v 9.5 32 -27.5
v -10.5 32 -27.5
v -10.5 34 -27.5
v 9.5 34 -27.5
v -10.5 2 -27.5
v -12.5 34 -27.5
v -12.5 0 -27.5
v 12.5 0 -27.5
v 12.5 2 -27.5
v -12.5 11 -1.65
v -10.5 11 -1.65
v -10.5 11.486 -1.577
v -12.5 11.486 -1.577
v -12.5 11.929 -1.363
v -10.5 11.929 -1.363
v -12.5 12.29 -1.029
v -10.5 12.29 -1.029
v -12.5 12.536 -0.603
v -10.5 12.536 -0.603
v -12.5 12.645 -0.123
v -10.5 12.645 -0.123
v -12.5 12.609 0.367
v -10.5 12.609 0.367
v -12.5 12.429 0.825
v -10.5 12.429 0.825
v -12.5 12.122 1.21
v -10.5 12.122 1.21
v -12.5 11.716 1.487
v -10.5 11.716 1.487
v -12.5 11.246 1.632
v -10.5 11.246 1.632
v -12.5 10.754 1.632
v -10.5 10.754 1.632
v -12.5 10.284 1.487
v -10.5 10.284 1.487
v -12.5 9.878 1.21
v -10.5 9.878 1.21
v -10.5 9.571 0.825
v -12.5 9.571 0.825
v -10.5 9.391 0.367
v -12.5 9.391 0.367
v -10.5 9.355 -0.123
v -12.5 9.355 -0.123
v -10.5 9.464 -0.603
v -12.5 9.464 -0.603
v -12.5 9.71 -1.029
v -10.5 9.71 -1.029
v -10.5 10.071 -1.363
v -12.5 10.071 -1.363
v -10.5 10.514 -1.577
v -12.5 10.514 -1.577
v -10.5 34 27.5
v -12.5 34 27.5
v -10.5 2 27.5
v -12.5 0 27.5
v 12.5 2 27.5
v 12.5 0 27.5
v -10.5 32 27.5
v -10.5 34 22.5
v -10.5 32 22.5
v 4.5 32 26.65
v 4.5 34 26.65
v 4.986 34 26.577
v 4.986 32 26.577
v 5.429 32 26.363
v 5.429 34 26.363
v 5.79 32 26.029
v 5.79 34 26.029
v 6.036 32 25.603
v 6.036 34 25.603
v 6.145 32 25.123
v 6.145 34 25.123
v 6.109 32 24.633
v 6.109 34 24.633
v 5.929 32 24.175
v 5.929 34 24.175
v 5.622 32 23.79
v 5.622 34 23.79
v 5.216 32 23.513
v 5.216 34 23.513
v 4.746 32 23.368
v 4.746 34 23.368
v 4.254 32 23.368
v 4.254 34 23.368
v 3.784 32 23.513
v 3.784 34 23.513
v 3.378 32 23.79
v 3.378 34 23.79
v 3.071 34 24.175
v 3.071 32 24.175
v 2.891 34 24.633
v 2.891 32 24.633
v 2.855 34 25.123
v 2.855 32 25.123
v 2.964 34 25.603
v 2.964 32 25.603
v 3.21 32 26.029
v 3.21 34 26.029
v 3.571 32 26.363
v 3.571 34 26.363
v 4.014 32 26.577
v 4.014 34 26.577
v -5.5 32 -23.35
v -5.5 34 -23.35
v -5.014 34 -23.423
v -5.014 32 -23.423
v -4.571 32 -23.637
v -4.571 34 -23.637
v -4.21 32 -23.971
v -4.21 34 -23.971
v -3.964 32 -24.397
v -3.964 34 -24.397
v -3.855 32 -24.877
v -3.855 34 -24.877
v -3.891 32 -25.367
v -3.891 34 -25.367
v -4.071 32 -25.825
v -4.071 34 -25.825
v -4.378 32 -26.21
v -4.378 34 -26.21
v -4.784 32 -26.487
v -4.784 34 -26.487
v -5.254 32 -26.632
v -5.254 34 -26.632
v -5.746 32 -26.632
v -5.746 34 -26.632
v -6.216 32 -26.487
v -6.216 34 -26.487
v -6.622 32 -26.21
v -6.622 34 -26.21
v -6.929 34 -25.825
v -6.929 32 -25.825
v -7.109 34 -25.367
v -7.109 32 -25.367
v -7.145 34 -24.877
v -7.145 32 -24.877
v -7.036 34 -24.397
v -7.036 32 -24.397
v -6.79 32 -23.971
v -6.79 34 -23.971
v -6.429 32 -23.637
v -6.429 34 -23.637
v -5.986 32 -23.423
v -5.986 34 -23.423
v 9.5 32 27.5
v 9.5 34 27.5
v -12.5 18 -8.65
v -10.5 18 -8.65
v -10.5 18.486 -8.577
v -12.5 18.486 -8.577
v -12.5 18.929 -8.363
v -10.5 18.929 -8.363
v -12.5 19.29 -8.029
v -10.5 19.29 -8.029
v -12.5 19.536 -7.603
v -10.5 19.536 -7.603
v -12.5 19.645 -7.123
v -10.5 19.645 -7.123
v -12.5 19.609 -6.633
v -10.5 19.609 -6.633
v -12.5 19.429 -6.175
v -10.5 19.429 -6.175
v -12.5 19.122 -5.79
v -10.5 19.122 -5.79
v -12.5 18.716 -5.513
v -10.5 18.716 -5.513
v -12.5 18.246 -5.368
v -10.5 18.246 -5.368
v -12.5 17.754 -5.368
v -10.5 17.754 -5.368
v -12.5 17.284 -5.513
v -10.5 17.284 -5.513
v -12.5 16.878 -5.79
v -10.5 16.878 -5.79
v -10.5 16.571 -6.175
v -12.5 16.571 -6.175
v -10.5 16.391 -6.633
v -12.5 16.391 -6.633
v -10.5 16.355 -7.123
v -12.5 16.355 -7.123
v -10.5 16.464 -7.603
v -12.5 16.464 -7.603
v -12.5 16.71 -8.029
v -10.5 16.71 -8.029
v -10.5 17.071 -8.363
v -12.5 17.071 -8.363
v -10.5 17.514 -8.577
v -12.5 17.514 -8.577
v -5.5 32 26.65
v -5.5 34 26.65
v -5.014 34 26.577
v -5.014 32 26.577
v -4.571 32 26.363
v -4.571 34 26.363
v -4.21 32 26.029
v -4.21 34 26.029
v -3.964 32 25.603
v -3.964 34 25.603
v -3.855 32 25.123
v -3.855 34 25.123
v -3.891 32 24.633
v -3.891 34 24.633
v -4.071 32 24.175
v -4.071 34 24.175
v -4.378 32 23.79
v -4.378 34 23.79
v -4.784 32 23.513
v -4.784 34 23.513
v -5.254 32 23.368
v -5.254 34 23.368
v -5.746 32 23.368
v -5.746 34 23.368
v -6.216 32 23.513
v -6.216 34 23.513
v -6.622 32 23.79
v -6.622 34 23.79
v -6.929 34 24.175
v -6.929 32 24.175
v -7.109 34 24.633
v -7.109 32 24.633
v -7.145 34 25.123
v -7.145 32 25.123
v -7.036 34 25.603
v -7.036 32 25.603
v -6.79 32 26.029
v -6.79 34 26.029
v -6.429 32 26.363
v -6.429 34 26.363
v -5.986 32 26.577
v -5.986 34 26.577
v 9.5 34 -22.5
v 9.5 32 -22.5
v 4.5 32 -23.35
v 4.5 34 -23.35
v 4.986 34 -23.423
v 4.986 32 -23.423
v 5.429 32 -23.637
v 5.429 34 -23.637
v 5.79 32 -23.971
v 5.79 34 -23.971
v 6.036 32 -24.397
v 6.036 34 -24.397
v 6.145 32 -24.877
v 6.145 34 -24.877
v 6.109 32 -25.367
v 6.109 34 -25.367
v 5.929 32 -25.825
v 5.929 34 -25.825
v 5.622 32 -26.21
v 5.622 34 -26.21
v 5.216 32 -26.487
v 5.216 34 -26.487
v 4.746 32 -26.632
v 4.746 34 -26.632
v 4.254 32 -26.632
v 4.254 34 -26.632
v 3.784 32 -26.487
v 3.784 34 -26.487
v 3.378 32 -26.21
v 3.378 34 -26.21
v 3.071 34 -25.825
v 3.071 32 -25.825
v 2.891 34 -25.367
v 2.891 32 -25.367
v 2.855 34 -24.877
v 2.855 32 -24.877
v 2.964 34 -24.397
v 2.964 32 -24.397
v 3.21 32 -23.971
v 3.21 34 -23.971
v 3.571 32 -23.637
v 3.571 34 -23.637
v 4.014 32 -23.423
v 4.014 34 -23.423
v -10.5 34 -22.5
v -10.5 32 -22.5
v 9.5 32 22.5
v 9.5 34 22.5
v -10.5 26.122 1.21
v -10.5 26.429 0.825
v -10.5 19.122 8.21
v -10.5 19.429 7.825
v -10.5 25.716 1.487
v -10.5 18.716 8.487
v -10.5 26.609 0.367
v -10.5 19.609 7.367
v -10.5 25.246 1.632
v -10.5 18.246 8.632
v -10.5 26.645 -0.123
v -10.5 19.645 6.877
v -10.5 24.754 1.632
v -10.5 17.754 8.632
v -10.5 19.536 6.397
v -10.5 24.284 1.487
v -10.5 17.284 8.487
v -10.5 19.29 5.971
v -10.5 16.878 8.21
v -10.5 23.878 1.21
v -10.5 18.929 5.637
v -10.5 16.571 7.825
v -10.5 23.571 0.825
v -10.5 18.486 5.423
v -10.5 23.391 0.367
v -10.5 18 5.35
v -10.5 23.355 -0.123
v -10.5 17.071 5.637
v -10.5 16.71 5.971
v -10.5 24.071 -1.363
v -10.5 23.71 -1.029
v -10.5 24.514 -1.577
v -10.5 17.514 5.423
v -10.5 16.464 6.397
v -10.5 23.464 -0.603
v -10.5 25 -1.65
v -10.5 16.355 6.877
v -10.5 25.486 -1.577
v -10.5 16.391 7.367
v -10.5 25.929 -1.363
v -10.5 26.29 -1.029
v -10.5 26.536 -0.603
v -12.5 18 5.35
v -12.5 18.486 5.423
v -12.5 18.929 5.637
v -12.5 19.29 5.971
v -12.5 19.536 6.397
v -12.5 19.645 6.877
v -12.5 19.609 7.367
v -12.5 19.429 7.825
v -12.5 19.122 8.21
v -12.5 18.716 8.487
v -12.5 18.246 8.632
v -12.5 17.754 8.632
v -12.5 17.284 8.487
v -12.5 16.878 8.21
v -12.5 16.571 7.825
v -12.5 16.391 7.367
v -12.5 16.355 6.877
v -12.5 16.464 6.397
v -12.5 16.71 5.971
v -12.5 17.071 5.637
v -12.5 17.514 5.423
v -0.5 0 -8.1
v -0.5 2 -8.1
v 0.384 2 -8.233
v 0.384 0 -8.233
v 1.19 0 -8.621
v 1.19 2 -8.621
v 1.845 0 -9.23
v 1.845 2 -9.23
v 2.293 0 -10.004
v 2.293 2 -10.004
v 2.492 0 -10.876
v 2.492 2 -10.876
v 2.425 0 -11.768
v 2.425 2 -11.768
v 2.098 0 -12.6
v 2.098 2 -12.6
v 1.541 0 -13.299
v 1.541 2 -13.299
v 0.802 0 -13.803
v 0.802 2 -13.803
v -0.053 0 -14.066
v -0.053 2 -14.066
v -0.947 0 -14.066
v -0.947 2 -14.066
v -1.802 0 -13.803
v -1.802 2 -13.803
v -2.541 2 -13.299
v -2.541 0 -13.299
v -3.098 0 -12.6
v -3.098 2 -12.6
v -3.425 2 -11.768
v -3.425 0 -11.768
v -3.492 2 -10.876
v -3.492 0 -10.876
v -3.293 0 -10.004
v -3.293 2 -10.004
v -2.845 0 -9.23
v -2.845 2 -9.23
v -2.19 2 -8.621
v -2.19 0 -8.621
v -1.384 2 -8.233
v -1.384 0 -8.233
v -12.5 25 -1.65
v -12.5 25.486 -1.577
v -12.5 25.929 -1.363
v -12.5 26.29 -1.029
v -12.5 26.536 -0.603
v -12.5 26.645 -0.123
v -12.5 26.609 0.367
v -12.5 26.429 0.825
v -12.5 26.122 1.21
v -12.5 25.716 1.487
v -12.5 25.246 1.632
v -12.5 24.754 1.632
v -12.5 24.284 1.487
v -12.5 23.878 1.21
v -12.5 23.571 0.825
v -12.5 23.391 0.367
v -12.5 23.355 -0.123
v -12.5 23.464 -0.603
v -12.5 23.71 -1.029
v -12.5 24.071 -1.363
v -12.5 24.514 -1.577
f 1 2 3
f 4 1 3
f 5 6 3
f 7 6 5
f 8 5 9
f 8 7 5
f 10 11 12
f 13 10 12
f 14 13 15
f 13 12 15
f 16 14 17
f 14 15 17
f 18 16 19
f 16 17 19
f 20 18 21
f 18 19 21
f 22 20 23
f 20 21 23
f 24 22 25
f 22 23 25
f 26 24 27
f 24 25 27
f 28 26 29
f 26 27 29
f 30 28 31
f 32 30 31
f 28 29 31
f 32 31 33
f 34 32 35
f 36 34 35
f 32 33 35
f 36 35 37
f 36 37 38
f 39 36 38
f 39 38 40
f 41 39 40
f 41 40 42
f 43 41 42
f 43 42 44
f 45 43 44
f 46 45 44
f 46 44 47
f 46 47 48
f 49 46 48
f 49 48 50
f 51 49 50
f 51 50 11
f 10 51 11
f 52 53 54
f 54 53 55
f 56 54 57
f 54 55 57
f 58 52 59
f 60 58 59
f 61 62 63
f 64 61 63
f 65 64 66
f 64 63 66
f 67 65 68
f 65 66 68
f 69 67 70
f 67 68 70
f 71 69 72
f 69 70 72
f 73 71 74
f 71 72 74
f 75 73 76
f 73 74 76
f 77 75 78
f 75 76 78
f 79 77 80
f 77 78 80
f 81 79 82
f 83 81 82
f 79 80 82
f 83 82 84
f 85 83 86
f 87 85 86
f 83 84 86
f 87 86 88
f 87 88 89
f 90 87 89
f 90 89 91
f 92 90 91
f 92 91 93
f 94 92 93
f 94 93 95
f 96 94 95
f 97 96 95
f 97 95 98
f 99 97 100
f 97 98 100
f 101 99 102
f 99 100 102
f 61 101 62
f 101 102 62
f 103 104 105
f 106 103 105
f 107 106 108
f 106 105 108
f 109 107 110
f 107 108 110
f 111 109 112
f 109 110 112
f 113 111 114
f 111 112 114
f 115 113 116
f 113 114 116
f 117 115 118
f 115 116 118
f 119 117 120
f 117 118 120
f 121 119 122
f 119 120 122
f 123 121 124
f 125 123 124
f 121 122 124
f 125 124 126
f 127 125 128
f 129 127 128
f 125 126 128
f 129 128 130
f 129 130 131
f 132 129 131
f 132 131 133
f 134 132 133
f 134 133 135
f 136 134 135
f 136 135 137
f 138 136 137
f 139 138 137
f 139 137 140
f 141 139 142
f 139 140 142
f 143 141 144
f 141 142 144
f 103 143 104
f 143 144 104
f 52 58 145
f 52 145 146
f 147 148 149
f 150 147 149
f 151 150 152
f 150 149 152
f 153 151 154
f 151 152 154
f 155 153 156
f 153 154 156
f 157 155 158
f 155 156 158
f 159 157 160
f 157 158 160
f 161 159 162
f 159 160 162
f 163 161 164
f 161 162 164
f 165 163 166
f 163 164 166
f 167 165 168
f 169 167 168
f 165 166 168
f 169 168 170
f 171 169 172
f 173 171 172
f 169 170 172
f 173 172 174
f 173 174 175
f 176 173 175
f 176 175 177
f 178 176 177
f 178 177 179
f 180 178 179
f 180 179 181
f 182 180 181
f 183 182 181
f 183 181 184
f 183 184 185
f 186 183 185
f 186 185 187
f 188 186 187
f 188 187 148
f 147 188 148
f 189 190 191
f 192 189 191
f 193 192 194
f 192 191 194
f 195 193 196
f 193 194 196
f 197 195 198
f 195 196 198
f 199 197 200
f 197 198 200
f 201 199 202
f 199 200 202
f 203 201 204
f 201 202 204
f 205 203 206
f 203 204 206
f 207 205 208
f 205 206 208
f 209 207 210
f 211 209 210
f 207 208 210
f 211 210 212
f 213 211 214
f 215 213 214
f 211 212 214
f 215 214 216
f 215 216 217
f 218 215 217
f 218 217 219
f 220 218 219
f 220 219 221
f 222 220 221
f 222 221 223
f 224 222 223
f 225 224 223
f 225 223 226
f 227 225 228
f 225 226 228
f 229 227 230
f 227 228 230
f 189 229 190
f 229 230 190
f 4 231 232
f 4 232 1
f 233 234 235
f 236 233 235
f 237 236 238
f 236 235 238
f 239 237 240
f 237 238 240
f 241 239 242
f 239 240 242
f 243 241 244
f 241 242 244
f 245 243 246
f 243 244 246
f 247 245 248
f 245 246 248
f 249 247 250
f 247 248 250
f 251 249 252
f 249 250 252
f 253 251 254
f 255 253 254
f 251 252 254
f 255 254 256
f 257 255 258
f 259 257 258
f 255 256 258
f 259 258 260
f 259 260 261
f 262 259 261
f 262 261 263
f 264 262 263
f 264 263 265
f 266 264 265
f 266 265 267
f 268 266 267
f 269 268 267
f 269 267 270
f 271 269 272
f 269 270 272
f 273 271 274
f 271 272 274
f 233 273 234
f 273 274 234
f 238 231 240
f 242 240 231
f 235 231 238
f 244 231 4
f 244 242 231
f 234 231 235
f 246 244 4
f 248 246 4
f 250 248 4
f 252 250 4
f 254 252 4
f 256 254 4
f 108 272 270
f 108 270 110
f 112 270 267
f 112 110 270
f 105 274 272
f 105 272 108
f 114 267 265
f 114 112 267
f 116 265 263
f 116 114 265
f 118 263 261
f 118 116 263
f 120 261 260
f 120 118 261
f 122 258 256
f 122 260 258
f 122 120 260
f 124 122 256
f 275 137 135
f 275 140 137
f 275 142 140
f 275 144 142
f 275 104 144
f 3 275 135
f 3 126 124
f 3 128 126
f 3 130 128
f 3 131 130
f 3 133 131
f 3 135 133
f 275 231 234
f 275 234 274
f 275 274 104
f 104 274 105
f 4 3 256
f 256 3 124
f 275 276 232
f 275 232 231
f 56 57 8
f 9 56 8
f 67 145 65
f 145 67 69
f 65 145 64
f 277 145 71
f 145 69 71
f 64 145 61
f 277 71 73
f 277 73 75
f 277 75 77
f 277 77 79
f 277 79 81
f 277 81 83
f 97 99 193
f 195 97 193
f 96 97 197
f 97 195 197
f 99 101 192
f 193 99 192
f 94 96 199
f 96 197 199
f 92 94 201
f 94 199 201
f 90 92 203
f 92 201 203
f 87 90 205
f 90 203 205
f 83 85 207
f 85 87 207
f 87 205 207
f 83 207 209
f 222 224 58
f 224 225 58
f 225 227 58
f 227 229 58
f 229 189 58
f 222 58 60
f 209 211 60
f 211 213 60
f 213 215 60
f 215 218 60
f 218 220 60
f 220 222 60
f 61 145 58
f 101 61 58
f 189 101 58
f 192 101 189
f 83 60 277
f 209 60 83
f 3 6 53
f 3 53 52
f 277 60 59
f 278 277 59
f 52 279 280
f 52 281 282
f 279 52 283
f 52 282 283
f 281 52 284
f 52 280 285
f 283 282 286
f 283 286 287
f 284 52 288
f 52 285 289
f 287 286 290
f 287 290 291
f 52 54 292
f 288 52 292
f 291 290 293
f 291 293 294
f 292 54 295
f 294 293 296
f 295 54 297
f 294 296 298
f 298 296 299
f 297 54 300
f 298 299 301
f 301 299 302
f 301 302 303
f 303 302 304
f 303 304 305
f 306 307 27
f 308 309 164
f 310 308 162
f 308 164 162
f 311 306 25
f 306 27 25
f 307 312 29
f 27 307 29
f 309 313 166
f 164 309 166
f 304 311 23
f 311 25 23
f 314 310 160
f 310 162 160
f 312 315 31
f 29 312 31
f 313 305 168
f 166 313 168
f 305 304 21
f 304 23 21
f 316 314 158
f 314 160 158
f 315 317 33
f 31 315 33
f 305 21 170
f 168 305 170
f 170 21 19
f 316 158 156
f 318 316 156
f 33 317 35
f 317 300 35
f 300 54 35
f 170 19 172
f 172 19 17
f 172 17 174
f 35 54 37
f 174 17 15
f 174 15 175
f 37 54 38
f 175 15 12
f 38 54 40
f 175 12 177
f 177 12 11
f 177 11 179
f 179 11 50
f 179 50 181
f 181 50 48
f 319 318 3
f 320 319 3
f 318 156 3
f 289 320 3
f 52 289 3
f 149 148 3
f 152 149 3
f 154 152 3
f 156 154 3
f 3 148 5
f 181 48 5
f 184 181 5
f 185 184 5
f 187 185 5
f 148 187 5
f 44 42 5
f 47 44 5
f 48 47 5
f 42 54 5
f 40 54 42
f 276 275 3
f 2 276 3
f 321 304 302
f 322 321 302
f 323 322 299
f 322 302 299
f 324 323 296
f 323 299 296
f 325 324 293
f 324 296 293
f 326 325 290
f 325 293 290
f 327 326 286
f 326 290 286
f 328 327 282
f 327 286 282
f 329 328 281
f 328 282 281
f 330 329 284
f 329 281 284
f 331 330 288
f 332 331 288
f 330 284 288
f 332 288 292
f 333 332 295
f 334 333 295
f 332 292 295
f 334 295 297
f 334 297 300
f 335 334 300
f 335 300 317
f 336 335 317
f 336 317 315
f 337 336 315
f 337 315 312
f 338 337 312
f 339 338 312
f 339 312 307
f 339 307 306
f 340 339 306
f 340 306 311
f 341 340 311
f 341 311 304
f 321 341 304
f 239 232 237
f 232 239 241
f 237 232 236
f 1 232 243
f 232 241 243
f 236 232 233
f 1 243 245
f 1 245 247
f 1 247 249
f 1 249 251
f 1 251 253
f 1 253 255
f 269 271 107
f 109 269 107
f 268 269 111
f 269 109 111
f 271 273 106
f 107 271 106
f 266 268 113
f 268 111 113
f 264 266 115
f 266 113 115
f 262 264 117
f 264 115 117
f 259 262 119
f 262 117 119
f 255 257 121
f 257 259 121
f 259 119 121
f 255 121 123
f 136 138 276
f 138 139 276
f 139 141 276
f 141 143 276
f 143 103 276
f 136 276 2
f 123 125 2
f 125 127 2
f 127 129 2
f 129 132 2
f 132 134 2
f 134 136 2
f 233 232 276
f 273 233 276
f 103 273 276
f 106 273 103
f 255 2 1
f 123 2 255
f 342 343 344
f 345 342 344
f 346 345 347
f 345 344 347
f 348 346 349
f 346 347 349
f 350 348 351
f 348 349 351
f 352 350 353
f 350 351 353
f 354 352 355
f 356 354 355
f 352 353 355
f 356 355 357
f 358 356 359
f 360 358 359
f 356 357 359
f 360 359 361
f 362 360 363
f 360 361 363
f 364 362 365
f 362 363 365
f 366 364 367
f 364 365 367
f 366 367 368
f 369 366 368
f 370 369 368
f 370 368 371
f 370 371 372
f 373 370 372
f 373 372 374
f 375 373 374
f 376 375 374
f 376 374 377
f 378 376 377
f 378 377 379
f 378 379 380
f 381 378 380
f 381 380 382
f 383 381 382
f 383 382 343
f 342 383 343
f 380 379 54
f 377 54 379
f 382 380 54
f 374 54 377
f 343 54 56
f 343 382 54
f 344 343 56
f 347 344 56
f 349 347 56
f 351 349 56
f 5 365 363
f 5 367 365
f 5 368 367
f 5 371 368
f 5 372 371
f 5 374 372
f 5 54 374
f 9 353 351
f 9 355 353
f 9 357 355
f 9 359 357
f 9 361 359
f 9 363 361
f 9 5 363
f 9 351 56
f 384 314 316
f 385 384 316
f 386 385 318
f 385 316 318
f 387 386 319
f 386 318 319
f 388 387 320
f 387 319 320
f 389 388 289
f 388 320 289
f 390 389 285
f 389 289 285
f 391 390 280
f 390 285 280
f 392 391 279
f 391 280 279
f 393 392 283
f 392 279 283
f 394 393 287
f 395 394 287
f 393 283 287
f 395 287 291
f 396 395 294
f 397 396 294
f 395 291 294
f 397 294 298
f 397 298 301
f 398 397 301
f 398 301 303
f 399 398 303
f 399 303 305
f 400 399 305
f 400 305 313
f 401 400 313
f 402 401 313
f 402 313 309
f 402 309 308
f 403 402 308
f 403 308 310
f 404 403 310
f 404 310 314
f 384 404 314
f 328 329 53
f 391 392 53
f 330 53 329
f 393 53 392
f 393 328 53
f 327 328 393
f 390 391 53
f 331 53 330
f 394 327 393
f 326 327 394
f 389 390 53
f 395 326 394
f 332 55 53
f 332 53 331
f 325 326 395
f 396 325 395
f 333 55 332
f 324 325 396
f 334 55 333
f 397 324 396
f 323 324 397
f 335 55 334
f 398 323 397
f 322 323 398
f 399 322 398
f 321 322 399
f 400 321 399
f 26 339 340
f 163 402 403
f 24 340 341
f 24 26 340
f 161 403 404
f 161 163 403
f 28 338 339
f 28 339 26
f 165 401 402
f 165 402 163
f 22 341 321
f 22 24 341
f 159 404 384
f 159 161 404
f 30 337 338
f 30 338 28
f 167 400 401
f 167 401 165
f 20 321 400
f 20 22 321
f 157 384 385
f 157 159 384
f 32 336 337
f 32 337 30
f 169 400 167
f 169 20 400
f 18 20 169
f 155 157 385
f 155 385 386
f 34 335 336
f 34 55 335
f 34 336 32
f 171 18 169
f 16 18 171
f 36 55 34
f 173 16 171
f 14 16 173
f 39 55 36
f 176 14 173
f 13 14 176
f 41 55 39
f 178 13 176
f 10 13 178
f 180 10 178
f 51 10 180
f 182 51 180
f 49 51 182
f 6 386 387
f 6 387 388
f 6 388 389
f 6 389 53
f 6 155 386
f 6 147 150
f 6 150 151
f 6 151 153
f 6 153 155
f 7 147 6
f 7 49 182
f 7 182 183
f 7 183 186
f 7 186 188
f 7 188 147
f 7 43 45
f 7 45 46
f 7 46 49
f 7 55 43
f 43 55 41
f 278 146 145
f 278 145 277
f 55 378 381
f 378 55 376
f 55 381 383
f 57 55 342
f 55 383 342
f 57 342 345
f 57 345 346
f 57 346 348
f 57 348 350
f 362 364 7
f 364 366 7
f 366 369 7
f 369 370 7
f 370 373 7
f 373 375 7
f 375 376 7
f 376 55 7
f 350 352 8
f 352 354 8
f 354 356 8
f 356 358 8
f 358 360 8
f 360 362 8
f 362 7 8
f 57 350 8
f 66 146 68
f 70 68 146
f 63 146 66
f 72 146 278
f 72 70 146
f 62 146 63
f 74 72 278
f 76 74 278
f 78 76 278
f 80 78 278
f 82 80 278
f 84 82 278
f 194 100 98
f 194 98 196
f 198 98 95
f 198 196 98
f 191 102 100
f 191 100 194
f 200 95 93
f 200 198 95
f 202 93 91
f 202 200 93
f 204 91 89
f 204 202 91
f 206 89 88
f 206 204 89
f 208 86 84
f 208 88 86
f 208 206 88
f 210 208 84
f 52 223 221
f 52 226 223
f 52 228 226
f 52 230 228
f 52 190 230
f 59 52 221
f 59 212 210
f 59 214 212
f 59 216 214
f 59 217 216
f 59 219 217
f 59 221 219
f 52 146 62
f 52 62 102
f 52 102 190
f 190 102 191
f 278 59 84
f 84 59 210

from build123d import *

# Parameters (mm, degrees)
SKETCH_1_W          = 25
SKETCH_1_H          = 55
EXTRUDE_1_DEPTH     = 2
SKETCH_3_W          = 2
SKETCH_3_H          = 55
EXTRUDE_2_DEPTH     = 32
SKETCH_4_W          = 5
SKETCH_4_H          = 2
EXTRUDE_3_DEPTH     = 20
EXTRUDE_3_2_DEPTH   = 20
SKETCH_5_R          = 1.65
CUT_EXTRUDE_2_DEPTH = 2
SKETCH_6_R          = 1.65
CUT_EXTRUDE_3_DEPTH = 10
SKETCH_7_R          = 3
CUT_EXTRUDE_4_DEPTH = 10


with BuildPart() as part:
    # 草图1 → 凸台-拉伸1 (new body)
    with BuildSketch(Plane(origin=(0, 0, 0), x_dir=(1, 0, 0), z_dir=(0, 1, 0))):
        Rectangle(SKETCH_1_W, SKETCH_1_H)
    extrude(amount=EXTRUDE_1_DEPTH)

    # 草图3 → 凸台-拉伸2 (add)
    with BuildSketch(Plane(origin=(0, 2, 0), x_dir=(1, 0, 0), z_dir=(0, 1, 0))):
        with Locations((-11.5, 0)):
            Rectangle(SKETCH_3_W, SKETCH_3_H)
    extrude(amount=EXTRUDE_2_DEPTH)

    # 草图6 → 切除-拉伸3 (cut)
    with BuildSketch(Plane(origin=(-10.5, 0, 0), x_dir=(0, 0, -1), z_dir=(1, 0, 0))):
        with Locations((-7, 18)):
            Circle(SKETCH_6_R)
        with Locations((7, 18)):
            Circle(SKETCH_6_R)
        with Locations((0, 25)):
            Circle(SKETCH_6_R)
        with Locations((0, 11)):
            Circle(SKETCH_6_R)
    extrude(amount=-CUT_EXTRUDE_3_DEPTH, mode=Mode.SUBTRACT)

    # 草图7 → 切除-拉伸4 (cut)
    with BuildSketch(Plane(origin=(0, 2, 0), x_dir=(1, 0, 0), z_dir=(0, 1, 0))):
        with Locations(Location((-0.5, 11.1, 0), (0, 0, 270))):
            Circle(SKETCH_7_R)
    extrude(amount=-CUT_EXTRUDE_4_DEPTH, mode=Mode.SUBTRACT)


with BuildPart() as body_2:
    # 草图4 → 凸台-拉伸3 (new body)
    with BuildSketch(Plane(origin=(-10.5, 0, 0), x_dir=(0, 0, -1), z_dir=(1, 0, 0))):
        with Locations((25, 33)):
            Rectangle(SKETCH_4_W, SKETCH_4_H)
    extrude(amount=EXTRUDE_3_DEPTH)


with BuildPart() as body_3:
    # 草图4 → Extrude 3 2 (new body)
    with BuildSketch(Plane(origin=(-10.5, 0, 0), x_dir=(0, 0, -1), z_dir=(1, 0, 0))):
        with Locations((-25, 33)):
            Rectangle(SKETCH_4_W, SKETCH_4_H)
    extrude(amount=EXTRUDE_3_2_DEPTH)


with BuildPart() as cut_extrude_2_tool:
    # 草图5 → 切除-拉伸2 (new body)
    with BuildSketch(Plane(origin=(0, 34, 0), x_dir=(1, 0, 0), z_dir=(0, 1, 0))):
        with Locations(Location((-5.5, -25, 0), (0, 0, 270))):
            Circle(SKETCH_5_R)
        with Locations(Location((4.5, -25, 0), (0, 0, 270))):
            Circle(SKETCH_5_R)
        with Locations(Location((4.5, 25, 0), (0, 0, 270))):
            Circle(SKETCH_5_R)
        with Locations(Location((-5.5, 25, 0), (0, 0, 270))):
            Circle(SKETCH_5_R)
    extrude(amount=-CUT_EXTRUDE_2_DEPTH)


with BuildPart() as body_2_1:
    add(body_2.part)

    # 切除-拉伸2: cut by cut_extrude_2_tool
    add(cut_extrude_2_tool.part, mode=Mode.SUBTRACT)


with BuildPart() as body_3_1:
    add(body_3.part)

    # 切除-拉伸2: cut by cut_extrude_2_tool
    add(cut_extrude_2_tool.part, mode=Mode.SUBTRACT)


solid = Compound([part.part, body_2_1.part, body_3_1.part])
